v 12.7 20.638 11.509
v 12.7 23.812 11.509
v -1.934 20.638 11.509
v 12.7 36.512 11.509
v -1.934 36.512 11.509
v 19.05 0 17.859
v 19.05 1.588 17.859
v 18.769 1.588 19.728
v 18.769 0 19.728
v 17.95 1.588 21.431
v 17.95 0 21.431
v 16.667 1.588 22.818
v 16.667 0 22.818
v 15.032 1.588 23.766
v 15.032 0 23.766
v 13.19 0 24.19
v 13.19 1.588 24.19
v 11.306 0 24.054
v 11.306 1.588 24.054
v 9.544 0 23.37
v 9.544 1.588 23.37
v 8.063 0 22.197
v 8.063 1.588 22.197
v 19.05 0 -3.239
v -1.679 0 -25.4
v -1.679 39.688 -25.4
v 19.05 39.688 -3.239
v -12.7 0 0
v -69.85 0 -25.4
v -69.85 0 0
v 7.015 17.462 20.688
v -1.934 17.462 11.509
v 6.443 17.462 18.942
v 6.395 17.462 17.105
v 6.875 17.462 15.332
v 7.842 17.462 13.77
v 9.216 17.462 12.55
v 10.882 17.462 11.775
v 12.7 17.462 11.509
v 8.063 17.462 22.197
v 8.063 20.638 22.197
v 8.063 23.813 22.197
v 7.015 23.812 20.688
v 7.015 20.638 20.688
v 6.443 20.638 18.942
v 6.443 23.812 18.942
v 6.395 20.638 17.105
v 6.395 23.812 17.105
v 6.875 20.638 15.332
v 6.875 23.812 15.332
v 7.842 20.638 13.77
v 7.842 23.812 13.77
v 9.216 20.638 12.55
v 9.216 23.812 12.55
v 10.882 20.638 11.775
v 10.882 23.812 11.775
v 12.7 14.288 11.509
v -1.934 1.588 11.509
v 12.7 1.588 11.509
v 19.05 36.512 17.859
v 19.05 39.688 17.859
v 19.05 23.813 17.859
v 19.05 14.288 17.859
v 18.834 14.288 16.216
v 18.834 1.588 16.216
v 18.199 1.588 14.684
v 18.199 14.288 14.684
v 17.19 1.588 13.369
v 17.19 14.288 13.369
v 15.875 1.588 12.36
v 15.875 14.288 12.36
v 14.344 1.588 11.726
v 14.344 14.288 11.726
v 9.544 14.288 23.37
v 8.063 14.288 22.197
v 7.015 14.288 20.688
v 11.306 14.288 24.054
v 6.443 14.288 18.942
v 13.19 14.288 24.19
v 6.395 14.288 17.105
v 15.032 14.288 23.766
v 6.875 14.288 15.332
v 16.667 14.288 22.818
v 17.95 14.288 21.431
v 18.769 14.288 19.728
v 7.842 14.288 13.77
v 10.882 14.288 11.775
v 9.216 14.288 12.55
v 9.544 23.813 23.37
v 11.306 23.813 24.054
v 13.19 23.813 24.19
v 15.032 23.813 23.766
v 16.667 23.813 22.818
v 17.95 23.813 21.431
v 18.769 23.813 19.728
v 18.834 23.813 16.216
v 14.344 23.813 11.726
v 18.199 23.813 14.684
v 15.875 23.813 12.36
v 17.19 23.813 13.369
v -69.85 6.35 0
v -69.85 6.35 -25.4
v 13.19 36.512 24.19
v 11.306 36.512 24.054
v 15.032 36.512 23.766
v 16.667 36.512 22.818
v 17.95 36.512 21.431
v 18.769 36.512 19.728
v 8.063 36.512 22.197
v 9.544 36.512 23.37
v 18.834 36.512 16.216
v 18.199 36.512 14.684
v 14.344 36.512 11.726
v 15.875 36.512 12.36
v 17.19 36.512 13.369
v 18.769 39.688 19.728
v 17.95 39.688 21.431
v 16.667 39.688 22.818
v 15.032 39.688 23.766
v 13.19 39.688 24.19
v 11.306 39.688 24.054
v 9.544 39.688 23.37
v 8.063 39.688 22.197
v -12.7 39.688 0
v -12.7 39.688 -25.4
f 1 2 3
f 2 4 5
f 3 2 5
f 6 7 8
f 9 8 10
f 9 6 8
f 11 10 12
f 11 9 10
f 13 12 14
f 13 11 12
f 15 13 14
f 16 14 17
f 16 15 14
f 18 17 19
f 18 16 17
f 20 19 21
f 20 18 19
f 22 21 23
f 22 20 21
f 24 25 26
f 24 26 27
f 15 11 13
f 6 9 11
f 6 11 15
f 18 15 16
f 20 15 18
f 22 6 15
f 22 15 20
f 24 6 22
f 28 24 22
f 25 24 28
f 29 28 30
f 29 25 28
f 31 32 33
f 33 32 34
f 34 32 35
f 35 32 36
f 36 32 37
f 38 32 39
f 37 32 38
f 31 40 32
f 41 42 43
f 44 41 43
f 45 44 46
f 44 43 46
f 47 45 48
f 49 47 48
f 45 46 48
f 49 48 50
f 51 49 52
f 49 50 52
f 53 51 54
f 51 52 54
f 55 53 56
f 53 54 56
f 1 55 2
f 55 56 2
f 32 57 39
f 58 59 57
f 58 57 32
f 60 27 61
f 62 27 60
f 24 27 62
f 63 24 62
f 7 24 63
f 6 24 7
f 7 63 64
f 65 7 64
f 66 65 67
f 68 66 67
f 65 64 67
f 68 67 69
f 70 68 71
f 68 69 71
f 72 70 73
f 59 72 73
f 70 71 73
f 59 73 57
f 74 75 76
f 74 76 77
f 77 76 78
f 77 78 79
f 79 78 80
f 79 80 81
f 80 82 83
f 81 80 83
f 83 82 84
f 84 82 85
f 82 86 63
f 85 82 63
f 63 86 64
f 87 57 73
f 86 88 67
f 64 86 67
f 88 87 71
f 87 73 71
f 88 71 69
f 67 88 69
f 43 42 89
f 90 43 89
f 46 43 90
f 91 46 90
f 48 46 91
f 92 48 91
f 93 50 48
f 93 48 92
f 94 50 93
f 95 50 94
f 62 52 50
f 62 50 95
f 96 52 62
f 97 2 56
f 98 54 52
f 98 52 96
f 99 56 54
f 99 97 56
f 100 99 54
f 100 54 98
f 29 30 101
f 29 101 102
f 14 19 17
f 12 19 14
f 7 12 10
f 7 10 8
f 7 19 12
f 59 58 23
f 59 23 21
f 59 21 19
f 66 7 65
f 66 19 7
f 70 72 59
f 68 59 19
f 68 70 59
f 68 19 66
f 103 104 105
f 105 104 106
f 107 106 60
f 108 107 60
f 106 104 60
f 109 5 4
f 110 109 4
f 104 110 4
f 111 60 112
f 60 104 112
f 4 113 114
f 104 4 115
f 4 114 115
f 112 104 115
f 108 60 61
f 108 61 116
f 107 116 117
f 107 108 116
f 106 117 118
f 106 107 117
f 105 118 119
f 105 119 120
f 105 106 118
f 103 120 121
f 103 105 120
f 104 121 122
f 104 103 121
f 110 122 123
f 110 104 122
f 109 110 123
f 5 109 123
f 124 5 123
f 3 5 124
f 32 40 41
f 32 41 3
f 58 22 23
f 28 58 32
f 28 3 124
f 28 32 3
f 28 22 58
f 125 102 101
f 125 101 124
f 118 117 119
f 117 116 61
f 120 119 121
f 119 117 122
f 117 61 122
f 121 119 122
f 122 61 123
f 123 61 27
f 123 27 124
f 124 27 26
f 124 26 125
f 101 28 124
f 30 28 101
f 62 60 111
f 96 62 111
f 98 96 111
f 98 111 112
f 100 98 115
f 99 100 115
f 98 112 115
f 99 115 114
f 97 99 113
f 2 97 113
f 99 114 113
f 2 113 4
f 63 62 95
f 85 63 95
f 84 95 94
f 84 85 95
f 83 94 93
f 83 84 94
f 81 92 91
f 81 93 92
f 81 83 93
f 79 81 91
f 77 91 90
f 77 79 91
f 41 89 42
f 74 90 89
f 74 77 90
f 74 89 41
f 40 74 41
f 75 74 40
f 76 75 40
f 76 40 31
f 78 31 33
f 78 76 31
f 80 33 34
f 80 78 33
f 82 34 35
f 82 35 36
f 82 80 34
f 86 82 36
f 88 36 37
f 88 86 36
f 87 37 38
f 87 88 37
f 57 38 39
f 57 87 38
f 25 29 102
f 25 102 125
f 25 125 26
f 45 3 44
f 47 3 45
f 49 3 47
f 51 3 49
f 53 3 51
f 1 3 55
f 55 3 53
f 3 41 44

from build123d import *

# Parameters (mm, degrees)
BOSS_EXTRUDE1_DEPTH = 39.6875
CUT_EXTRUDE1_DEPTH  = 12.7
CUT_EXTRUDE2_DEPTH  = 12.7
CUT_EXTRUDE3_DEPTH  = 3.175
CUT_EXTRUDE4_START  = -9.525
CUT_EXTRUDE4_DEPTH  = 3.175
CUT_EXTRUDE5_DEPTH  = 50.609375


with BuildPart() as part:
    # Sketch1 → Boss-Extrude1 (new body)
    with BuildSketch(Plane(origin=(0, 0, 0), x_dir=(1, 0, 0), z_dir=(0, 1, 0))):
        with BuildLine():
            Line((-12.7, 0), (-69.85, 0))
            Line((-69.85, 0), (-69.85, 25.4))
            Line((-69.85, 25.4), (-1.678775343, 25.4))
            Line((-1.678775343, 25.4), (19.05, 3.238927777))
            Line((19.05, 3.238927777), (19.05, -17.859375))
            ThreePointArc((19.05, -17.859375), (15.031784758, -23.765751202), (8.062510285, -22.19713815))
            Line((8.062510285, -22.19713815), (-12.7, 0))
        make_face()
    extrude(amount=BOSS_EXTRUDE1_DEPTH)

    # Sketch2 → Cut-Extrude1 (cut)
    with BuildSketch(Plane(origin=(0, 36.5125, 0), x_dir=(1, 0, 0), z_dir=(0, 1, 0))):
        with BuildLine():
            Line((12.7, -11.509375), (-1.934489816, -11.509375))
            Line((-1.934489816, -11.509375), (8.062510285, -22.19713815))
            ThreePointArc((8.062510285, -22.19713815), (18.525259479, -20.386992851), (12.7, -11.509375))
        make_face()
    extrude(amount=-CUT_EXTRUDE1_DEPTH, mode=Mode.SUBTRACT)

    # Sketch3 → Cut-Extrude2 (cut)
    with BuildSketch(Plane(origin=(0, 14.2875, 0), x_dir=(1, 0, 0), z_dir=(0, 1, 0))):
        with BuildLine():
            Line((12.7, -11.509375), (-1.934489816, -11.509375))
            Line((-1.934489816, -11.509375), (8.062510285, -22.19713815))
            ThreePointArc((8.062510285, -22.19713815), (18.525259479, -20.386992851), (12.7, -11.509375))
        make_face()
    extrude(amount=-CUT_EXTRUDE2_DEPTH, mode=Mode.SUBTRACT)

    # Sketch4 → Cut-Extrude3 (cut)
    with BuildSketch(Plane(origin=(0, 23.8125, 0), x_dir=(1, 0, 0), z_dir=(0, 1, 0))):
        with BuildLine():
            Line((12.7, -11.509375), (-1.934489816, -11.509375))
            Line((-1.934489816, -11.509375), (8.062510285, -22.19713815))
            ThreePointArc((8.062510285, -22.19713815), (6.874740521, -15.331757149), (12.7, -11.509375))
        make_face()
    extrude(amount=-CUT_EXTRUDE3_DEPTH, mode=Mode.SUBTRACT)

    # Sketch4<2> → Cut-Extrude4 (cut)
    with BuildSketch(Plane(origin=(0, 23.8125, 0), x_dir=(1, 0, 0), z_dir=(0, 1, 0)).offset(CUT_EXTRUDE4_START)):
        with BuildLine():
            Line((12.7, -11.509375), (-1.934489816, -11.509375))
            Line((-1.934489816, -11.509375), (8.062510285, -22.19713815))
            ThreePointArc((8.062510285, -22.19713815), (6.874740521, -15.331757149), (12.7, -11.509375))
        make_face()
    extrude(amount=CUT_EXTRUDE4_DEPTH, mode=Mode.SUBTRACT)

    # Sketch5 → Cut-Extrude5 (cut, through all)
    with BuildSketch(Plane(origin=(0, 0, -25.4), x_dir=(-1, 0, 0), z_dir=(0, 0, -1))):
        Polygon((69.85, 6.35), (12.7, 39.6875), (69.85, 39.6875), align=None)
    extrude(amount=-CUT_EXTRUDE5_DEPTH, mode=Mode.SUBTRACT)


solid = part.part
